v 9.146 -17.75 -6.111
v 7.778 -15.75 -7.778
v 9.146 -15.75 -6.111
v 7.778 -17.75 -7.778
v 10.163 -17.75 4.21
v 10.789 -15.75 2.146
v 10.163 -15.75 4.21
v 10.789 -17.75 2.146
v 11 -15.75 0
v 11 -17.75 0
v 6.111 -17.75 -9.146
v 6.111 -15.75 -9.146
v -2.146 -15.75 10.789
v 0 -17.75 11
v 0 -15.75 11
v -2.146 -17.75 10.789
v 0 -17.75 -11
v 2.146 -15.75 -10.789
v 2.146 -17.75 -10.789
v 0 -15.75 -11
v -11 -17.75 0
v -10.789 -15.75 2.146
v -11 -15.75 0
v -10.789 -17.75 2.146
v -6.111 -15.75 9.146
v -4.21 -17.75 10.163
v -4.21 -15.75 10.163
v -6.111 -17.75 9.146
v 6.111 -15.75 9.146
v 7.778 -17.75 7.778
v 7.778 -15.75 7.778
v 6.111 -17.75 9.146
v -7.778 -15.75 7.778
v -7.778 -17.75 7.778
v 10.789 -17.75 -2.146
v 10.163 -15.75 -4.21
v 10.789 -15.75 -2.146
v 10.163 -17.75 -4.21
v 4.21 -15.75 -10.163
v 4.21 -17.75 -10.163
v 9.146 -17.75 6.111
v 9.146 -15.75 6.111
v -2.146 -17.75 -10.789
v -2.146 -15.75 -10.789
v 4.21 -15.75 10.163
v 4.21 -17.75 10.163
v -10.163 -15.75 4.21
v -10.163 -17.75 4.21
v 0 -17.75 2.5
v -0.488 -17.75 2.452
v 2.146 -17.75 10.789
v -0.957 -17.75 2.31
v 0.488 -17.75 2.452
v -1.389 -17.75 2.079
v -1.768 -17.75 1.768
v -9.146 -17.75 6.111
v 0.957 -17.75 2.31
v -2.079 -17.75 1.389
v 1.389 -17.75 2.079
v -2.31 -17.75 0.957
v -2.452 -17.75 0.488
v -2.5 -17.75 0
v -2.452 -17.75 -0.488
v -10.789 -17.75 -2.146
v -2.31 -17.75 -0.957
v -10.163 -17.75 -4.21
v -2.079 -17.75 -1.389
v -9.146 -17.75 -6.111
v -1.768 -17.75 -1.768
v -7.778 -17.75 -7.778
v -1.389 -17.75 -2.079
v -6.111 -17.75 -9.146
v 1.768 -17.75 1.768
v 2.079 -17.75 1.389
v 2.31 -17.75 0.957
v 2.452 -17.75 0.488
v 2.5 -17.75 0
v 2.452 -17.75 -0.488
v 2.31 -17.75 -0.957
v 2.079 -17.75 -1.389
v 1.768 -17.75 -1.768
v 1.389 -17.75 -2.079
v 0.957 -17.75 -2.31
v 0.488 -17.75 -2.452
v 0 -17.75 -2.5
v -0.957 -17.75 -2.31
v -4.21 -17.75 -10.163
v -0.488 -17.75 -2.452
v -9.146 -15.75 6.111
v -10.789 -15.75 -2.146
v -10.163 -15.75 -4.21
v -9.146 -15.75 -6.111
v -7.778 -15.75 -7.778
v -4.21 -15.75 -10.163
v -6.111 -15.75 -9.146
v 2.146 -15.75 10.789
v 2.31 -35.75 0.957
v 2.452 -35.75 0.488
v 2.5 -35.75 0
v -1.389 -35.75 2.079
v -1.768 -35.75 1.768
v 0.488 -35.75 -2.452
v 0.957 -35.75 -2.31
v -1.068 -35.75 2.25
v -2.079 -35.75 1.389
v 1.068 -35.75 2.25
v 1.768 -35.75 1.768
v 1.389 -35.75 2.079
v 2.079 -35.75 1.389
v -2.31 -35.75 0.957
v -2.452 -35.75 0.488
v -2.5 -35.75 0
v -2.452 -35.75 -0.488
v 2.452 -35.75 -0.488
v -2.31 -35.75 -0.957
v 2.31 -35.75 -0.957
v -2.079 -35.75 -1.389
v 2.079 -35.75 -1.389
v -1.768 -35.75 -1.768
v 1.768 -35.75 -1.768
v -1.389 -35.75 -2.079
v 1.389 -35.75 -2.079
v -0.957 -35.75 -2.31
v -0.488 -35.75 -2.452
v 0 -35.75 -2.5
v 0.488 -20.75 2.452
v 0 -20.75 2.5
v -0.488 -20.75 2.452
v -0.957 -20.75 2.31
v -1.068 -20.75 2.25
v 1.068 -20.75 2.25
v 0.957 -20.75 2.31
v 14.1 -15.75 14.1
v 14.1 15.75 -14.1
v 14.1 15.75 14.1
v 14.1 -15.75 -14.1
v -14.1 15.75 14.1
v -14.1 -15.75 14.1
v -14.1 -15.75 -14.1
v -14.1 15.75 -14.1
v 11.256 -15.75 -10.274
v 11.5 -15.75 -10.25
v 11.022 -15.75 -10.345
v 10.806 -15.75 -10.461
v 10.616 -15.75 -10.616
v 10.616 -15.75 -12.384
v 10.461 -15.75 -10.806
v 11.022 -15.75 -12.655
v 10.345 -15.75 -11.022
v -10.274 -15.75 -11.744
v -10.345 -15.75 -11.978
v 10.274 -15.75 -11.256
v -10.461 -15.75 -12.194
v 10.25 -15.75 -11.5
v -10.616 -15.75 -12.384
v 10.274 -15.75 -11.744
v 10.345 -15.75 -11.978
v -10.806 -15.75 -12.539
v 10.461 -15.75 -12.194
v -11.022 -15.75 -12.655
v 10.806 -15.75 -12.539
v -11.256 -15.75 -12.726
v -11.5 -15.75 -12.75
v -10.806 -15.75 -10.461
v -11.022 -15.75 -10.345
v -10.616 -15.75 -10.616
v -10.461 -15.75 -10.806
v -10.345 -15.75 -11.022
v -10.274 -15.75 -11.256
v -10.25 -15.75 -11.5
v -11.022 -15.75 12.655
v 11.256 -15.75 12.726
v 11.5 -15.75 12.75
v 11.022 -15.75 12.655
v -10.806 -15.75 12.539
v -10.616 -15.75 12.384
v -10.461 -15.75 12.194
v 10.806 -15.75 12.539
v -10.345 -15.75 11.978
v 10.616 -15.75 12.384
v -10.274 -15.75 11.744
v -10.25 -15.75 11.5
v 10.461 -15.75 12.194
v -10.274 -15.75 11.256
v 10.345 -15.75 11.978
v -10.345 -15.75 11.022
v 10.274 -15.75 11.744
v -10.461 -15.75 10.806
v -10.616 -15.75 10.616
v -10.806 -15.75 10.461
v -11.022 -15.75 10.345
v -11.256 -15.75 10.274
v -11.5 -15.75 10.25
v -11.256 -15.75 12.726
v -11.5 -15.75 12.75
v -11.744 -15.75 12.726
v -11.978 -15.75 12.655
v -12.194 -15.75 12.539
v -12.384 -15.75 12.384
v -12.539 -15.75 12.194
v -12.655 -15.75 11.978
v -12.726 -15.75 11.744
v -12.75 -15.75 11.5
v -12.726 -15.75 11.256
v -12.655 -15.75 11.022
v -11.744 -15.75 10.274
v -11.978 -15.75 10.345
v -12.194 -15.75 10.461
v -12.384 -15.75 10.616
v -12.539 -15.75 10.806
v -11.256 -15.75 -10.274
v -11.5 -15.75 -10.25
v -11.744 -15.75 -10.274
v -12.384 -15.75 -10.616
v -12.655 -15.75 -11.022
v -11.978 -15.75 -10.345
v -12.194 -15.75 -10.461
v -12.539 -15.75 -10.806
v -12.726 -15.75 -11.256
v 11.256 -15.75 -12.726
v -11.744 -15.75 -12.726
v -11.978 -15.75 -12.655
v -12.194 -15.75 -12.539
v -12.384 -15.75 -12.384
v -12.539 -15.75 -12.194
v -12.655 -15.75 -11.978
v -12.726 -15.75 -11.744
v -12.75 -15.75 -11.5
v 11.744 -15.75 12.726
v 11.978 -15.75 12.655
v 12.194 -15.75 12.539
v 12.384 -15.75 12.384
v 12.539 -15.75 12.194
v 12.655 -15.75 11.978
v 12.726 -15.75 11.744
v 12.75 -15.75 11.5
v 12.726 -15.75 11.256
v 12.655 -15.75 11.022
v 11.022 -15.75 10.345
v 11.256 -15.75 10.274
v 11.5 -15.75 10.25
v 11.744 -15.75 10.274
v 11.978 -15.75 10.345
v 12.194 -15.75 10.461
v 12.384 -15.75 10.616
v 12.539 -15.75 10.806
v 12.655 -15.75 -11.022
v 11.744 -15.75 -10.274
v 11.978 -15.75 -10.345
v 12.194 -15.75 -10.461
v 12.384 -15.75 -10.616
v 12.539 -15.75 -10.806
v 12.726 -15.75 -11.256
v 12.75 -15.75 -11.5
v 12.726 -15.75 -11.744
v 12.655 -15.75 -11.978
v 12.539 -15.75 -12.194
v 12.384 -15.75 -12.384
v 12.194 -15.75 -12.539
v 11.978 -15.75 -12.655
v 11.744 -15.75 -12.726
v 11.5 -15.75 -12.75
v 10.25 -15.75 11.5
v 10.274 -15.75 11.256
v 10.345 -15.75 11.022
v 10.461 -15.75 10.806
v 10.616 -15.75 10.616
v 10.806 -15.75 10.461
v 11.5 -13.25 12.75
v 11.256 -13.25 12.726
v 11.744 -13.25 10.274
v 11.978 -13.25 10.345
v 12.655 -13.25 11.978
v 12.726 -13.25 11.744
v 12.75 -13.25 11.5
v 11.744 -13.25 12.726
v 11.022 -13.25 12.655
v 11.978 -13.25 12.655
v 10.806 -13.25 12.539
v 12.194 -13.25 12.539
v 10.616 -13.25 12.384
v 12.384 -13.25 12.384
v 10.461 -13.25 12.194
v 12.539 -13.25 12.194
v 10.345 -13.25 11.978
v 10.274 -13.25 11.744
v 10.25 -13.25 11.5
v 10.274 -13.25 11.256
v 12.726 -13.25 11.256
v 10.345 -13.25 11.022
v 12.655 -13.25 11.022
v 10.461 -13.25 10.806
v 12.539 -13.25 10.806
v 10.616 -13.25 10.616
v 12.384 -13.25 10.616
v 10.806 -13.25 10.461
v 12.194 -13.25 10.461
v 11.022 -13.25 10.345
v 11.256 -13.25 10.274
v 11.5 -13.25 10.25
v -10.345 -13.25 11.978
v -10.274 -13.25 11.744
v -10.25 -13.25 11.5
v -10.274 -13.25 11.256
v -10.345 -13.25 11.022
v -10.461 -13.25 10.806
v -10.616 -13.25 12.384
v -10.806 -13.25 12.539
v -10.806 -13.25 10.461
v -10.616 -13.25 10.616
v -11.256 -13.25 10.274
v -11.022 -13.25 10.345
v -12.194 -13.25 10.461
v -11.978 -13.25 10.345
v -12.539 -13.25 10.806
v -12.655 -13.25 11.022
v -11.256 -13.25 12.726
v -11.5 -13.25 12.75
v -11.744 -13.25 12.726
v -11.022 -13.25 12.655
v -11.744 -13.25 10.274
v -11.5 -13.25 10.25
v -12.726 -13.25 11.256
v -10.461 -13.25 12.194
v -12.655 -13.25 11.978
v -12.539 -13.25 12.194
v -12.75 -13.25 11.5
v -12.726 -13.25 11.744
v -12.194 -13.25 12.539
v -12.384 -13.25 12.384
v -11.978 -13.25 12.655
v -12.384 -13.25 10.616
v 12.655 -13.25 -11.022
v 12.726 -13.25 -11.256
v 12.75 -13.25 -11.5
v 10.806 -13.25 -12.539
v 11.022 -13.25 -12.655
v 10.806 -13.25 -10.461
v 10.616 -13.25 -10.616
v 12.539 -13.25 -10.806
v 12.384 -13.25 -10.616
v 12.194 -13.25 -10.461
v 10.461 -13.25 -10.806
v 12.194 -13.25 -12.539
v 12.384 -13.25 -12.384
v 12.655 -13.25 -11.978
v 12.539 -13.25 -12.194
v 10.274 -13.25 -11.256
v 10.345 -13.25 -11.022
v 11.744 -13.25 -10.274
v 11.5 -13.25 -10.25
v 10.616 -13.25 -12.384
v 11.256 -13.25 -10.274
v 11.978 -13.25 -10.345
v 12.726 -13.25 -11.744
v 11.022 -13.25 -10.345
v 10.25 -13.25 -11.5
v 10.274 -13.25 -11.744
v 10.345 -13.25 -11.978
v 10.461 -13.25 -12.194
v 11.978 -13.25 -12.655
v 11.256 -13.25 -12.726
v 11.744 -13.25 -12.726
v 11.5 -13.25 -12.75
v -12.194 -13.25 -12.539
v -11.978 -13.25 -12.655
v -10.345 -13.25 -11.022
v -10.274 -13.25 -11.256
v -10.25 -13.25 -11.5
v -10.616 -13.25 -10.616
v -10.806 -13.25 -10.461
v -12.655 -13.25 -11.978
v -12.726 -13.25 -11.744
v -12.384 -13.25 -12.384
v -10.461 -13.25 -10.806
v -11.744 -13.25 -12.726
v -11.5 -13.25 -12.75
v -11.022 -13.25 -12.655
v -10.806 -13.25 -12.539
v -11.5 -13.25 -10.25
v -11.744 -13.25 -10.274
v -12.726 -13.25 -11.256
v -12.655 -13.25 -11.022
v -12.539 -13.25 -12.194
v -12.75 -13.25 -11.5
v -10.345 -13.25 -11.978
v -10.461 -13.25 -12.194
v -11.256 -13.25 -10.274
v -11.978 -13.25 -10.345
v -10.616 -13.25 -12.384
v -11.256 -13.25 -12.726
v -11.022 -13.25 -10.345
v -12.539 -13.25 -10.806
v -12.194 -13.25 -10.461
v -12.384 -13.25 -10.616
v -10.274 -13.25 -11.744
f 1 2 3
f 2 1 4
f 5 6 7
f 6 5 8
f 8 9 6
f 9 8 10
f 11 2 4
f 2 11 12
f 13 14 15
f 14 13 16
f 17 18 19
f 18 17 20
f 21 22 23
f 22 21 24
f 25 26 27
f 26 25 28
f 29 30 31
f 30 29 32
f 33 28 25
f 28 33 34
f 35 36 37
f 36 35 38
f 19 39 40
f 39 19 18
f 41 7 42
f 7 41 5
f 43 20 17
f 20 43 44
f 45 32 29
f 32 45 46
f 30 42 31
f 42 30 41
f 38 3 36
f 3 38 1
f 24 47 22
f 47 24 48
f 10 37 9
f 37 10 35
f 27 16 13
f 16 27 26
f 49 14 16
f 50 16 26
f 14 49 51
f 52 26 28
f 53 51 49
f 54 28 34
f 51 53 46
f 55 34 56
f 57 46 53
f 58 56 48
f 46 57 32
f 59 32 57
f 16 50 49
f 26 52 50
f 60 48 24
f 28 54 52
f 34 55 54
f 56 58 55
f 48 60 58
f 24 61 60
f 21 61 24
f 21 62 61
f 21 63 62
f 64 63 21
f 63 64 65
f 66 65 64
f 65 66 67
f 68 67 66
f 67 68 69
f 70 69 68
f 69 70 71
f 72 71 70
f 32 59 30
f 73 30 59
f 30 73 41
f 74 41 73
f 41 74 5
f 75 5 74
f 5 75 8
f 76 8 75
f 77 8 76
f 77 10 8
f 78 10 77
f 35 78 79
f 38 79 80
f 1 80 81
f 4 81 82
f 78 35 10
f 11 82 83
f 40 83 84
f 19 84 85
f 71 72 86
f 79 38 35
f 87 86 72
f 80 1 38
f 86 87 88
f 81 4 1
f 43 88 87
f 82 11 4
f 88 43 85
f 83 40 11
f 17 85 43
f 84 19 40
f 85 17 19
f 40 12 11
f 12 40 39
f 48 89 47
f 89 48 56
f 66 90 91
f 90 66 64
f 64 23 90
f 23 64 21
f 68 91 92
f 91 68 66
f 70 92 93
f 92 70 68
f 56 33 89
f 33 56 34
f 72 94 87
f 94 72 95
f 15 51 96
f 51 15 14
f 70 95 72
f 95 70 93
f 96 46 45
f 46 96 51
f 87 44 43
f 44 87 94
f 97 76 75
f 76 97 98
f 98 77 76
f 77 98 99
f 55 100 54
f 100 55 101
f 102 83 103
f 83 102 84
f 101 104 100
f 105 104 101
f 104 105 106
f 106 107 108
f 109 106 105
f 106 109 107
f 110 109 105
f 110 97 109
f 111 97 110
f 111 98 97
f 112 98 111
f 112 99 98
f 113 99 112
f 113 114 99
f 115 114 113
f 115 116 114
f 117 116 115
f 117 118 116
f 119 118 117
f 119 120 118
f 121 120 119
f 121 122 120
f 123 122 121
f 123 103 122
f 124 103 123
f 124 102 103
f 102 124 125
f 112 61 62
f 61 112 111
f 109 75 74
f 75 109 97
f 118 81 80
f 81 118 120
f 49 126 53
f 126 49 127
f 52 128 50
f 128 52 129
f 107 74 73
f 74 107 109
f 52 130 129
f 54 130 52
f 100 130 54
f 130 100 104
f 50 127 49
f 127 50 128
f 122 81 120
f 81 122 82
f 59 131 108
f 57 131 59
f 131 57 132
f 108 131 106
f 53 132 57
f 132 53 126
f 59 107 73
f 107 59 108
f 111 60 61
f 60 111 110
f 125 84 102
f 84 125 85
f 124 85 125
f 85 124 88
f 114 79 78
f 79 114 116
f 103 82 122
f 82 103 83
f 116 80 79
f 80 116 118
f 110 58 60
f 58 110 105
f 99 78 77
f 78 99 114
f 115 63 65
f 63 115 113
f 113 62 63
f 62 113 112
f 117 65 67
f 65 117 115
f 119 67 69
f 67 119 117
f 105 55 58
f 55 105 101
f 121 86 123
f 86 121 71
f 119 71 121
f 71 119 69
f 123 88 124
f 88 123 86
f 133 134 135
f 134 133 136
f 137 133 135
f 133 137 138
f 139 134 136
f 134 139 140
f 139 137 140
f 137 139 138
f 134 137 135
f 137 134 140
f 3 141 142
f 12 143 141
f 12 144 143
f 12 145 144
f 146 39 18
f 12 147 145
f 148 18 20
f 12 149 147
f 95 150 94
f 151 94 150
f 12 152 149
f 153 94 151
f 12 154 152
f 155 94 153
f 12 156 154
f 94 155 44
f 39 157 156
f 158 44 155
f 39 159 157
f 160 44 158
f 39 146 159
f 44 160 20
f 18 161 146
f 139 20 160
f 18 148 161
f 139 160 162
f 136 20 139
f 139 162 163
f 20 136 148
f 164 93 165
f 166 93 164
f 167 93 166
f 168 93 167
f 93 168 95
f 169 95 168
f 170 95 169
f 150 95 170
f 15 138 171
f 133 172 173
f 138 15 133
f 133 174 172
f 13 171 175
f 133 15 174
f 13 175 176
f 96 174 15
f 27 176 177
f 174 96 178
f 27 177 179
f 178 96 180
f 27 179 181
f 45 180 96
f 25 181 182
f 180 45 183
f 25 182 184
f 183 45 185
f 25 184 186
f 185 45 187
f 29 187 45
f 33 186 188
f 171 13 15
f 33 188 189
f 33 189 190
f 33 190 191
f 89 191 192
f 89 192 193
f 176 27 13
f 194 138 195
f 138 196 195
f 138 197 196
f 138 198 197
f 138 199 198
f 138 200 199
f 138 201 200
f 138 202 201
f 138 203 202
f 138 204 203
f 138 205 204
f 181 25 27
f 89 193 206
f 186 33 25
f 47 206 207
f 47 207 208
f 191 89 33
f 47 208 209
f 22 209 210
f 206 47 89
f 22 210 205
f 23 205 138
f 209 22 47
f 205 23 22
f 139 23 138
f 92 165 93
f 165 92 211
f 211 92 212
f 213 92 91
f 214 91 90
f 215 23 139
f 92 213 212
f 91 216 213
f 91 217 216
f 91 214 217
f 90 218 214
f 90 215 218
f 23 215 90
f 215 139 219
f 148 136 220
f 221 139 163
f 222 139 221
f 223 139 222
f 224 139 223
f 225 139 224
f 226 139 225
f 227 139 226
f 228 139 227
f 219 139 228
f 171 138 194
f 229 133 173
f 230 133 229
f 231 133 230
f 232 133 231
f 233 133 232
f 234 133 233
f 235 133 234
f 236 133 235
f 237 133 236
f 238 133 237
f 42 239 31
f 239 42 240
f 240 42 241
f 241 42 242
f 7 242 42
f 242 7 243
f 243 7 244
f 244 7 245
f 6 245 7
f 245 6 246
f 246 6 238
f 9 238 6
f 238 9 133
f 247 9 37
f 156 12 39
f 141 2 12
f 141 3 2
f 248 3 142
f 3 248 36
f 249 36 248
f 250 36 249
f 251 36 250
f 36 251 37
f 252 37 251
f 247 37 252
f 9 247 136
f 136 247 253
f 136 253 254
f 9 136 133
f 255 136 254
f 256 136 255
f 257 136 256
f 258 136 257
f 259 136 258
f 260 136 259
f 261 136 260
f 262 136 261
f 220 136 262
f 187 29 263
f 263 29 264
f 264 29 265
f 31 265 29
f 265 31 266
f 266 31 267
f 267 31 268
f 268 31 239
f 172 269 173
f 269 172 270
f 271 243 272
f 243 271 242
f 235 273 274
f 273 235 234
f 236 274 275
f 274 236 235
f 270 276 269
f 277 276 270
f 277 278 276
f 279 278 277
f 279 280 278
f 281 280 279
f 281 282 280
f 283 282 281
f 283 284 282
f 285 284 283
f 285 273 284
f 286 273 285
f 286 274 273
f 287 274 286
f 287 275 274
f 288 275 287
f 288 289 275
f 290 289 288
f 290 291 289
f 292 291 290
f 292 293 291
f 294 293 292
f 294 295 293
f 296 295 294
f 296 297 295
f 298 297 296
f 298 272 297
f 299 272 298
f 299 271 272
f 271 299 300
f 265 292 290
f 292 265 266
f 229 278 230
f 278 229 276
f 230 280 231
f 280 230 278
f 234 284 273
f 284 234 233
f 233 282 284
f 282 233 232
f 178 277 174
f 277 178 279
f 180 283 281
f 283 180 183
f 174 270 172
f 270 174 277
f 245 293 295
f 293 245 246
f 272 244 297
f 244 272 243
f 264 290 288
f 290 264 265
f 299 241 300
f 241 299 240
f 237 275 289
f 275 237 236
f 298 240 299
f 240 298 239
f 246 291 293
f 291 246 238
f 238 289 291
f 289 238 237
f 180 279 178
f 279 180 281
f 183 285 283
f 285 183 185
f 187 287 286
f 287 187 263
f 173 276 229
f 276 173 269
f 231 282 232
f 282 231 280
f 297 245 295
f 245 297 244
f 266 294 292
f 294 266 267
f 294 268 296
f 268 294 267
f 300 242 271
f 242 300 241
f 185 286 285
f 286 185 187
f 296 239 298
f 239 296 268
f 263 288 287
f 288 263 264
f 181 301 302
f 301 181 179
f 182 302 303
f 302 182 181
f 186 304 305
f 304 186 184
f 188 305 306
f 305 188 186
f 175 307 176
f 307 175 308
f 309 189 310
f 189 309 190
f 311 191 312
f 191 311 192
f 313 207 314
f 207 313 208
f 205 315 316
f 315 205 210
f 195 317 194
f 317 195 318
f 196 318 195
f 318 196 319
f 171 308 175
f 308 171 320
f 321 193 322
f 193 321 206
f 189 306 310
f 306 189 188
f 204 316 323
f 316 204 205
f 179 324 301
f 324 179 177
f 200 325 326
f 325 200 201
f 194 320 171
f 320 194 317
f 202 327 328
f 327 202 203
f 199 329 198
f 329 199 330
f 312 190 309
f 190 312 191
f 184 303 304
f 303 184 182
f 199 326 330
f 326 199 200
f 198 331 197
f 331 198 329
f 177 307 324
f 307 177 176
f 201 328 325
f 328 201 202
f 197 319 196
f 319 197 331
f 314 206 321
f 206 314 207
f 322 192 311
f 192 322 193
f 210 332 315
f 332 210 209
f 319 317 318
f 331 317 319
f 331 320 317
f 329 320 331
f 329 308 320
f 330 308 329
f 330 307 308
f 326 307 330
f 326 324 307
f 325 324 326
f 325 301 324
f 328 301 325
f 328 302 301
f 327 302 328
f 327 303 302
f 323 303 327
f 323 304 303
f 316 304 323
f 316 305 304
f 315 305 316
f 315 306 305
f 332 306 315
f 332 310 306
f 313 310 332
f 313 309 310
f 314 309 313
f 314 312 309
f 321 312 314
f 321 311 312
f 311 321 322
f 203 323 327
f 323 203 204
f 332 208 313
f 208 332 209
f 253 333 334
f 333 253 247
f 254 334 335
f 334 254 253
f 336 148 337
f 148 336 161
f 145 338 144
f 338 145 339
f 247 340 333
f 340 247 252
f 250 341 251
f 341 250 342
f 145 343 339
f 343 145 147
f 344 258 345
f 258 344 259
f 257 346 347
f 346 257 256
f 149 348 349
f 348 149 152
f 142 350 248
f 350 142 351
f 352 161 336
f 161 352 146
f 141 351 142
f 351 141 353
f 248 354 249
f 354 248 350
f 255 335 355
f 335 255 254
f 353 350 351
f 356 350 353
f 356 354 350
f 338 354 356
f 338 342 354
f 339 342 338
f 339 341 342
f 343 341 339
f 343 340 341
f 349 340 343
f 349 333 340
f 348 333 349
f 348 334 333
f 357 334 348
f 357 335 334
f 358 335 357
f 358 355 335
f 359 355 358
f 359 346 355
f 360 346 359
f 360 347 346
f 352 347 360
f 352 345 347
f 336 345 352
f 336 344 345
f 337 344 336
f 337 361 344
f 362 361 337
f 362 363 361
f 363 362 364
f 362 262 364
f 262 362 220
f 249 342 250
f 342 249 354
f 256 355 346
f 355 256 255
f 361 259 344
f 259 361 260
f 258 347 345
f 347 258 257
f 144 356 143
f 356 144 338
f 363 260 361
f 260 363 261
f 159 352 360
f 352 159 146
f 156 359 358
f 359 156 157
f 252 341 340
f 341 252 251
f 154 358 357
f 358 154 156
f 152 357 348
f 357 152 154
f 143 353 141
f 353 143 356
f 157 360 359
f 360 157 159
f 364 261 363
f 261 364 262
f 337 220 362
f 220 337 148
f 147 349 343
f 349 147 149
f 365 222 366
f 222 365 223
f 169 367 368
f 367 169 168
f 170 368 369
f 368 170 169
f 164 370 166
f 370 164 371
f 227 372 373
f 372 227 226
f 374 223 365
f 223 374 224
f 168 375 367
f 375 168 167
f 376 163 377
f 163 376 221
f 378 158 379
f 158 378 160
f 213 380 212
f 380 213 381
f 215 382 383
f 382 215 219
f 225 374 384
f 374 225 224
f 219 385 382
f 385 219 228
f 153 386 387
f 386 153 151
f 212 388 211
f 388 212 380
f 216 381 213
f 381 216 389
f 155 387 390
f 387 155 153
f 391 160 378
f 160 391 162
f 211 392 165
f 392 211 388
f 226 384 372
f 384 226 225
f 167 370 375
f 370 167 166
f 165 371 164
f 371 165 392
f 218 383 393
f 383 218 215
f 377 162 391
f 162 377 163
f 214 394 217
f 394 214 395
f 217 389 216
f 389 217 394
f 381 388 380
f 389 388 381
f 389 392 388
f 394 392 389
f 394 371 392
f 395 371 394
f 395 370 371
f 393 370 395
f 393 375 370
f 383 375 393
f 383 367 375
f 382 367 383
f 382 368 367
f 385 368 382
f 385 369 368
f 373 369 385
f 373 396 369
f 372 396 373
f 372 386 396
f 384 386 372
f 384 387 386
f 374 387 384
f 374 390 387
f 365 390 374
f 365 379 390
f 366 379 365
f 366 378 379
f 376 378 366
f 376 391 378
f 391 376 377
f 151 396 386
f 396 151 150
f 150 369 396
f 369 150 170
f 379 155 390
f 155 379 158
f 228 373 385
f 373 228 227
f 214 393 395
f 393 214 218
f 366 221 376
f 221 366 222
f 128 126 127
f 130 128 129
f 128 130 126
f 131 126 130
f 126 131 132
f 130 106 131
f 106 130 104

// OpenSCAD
// WeePrusa
// Stepper Motors
// GNU GPL v3
// Thomas Phillips (tntexplosivesltd@gmail.com)
// https://github.com/tntexplosivesltd/WeePrusa

$fn = 32;

// Colours
black = [12/255, 12/255, 12/255];
grey = [200/255, 200/255, 200/255];

// Motor back
width = 28.2;
torque = 6;

// Shaft
shaft = 20;
shaft_radius = 2.5;
keyway = 15;
hub_radius = 11;
hub_width = 2;

// Screws
screw_size = 2.5;
screw_depth = 2.5;
screw_separation = 23;

function get_length(t) = lookup(t, [
			[4.3, 31.5],
			[6, 31.5],
			[7.5, 44.5],
			[9, 50.5],
			[9.5, 44.5],
			[12, 50.5],
	]);

length = get_length(torque);

difference()
{
	union()
	{
		color (black) cube ([width, length, width], center = true);
		color (grey)
		{
			translate ([0, -length/2, 0]) rotate ([90,0,0]) cylinder (h = hub_width*2, r1 = hub_radius, r2 = hub_radius, center = true);
			translate ([0, -length/2, 0]) rotate ([90,0,0]) cylinder (h = shaft*2, r1 = shaft_radius, r2 = shaft_radius, center = true);
		}
	}
	
	color (grey)
	{
		// screw holes
		translate ([screw_separation/2, -length/2, screw_separation/2]) rotate ([90,0,0]) cylinder (h = screw_depth*2, r1 = screw_size/2, r2 = screw_size/2, center = true);
		translate ([-screw_separation/2, -length/2, screw_separation/2]) rotate ([90,0,0]) cylinder (h = screw_depth*2, r1 = screw_size/2, r2 = screw_size/2, center = true);
		translate ([screw_separation/2, -length/2, -screw_separation/2]) rotate ([90,0,0]) cylinder (h = screw_depth*2, r1 = screw_size/2, r2 = screw_size/2, center = true);
		translate ([-screw_separation/2, -length/2, -screw_separation/2]) rotate ([90,0,0]) cylinder (h = screw_depth*2, r1 = screw_size/2, r2 = screw_size/2, center = true);

		// flat on shaft
		translate ([0, -length/2 - shaft, shaft_radius]) rotate ([90,0,0]) cube ([5, 0.5, keyway*2], center = true);
	}
}
